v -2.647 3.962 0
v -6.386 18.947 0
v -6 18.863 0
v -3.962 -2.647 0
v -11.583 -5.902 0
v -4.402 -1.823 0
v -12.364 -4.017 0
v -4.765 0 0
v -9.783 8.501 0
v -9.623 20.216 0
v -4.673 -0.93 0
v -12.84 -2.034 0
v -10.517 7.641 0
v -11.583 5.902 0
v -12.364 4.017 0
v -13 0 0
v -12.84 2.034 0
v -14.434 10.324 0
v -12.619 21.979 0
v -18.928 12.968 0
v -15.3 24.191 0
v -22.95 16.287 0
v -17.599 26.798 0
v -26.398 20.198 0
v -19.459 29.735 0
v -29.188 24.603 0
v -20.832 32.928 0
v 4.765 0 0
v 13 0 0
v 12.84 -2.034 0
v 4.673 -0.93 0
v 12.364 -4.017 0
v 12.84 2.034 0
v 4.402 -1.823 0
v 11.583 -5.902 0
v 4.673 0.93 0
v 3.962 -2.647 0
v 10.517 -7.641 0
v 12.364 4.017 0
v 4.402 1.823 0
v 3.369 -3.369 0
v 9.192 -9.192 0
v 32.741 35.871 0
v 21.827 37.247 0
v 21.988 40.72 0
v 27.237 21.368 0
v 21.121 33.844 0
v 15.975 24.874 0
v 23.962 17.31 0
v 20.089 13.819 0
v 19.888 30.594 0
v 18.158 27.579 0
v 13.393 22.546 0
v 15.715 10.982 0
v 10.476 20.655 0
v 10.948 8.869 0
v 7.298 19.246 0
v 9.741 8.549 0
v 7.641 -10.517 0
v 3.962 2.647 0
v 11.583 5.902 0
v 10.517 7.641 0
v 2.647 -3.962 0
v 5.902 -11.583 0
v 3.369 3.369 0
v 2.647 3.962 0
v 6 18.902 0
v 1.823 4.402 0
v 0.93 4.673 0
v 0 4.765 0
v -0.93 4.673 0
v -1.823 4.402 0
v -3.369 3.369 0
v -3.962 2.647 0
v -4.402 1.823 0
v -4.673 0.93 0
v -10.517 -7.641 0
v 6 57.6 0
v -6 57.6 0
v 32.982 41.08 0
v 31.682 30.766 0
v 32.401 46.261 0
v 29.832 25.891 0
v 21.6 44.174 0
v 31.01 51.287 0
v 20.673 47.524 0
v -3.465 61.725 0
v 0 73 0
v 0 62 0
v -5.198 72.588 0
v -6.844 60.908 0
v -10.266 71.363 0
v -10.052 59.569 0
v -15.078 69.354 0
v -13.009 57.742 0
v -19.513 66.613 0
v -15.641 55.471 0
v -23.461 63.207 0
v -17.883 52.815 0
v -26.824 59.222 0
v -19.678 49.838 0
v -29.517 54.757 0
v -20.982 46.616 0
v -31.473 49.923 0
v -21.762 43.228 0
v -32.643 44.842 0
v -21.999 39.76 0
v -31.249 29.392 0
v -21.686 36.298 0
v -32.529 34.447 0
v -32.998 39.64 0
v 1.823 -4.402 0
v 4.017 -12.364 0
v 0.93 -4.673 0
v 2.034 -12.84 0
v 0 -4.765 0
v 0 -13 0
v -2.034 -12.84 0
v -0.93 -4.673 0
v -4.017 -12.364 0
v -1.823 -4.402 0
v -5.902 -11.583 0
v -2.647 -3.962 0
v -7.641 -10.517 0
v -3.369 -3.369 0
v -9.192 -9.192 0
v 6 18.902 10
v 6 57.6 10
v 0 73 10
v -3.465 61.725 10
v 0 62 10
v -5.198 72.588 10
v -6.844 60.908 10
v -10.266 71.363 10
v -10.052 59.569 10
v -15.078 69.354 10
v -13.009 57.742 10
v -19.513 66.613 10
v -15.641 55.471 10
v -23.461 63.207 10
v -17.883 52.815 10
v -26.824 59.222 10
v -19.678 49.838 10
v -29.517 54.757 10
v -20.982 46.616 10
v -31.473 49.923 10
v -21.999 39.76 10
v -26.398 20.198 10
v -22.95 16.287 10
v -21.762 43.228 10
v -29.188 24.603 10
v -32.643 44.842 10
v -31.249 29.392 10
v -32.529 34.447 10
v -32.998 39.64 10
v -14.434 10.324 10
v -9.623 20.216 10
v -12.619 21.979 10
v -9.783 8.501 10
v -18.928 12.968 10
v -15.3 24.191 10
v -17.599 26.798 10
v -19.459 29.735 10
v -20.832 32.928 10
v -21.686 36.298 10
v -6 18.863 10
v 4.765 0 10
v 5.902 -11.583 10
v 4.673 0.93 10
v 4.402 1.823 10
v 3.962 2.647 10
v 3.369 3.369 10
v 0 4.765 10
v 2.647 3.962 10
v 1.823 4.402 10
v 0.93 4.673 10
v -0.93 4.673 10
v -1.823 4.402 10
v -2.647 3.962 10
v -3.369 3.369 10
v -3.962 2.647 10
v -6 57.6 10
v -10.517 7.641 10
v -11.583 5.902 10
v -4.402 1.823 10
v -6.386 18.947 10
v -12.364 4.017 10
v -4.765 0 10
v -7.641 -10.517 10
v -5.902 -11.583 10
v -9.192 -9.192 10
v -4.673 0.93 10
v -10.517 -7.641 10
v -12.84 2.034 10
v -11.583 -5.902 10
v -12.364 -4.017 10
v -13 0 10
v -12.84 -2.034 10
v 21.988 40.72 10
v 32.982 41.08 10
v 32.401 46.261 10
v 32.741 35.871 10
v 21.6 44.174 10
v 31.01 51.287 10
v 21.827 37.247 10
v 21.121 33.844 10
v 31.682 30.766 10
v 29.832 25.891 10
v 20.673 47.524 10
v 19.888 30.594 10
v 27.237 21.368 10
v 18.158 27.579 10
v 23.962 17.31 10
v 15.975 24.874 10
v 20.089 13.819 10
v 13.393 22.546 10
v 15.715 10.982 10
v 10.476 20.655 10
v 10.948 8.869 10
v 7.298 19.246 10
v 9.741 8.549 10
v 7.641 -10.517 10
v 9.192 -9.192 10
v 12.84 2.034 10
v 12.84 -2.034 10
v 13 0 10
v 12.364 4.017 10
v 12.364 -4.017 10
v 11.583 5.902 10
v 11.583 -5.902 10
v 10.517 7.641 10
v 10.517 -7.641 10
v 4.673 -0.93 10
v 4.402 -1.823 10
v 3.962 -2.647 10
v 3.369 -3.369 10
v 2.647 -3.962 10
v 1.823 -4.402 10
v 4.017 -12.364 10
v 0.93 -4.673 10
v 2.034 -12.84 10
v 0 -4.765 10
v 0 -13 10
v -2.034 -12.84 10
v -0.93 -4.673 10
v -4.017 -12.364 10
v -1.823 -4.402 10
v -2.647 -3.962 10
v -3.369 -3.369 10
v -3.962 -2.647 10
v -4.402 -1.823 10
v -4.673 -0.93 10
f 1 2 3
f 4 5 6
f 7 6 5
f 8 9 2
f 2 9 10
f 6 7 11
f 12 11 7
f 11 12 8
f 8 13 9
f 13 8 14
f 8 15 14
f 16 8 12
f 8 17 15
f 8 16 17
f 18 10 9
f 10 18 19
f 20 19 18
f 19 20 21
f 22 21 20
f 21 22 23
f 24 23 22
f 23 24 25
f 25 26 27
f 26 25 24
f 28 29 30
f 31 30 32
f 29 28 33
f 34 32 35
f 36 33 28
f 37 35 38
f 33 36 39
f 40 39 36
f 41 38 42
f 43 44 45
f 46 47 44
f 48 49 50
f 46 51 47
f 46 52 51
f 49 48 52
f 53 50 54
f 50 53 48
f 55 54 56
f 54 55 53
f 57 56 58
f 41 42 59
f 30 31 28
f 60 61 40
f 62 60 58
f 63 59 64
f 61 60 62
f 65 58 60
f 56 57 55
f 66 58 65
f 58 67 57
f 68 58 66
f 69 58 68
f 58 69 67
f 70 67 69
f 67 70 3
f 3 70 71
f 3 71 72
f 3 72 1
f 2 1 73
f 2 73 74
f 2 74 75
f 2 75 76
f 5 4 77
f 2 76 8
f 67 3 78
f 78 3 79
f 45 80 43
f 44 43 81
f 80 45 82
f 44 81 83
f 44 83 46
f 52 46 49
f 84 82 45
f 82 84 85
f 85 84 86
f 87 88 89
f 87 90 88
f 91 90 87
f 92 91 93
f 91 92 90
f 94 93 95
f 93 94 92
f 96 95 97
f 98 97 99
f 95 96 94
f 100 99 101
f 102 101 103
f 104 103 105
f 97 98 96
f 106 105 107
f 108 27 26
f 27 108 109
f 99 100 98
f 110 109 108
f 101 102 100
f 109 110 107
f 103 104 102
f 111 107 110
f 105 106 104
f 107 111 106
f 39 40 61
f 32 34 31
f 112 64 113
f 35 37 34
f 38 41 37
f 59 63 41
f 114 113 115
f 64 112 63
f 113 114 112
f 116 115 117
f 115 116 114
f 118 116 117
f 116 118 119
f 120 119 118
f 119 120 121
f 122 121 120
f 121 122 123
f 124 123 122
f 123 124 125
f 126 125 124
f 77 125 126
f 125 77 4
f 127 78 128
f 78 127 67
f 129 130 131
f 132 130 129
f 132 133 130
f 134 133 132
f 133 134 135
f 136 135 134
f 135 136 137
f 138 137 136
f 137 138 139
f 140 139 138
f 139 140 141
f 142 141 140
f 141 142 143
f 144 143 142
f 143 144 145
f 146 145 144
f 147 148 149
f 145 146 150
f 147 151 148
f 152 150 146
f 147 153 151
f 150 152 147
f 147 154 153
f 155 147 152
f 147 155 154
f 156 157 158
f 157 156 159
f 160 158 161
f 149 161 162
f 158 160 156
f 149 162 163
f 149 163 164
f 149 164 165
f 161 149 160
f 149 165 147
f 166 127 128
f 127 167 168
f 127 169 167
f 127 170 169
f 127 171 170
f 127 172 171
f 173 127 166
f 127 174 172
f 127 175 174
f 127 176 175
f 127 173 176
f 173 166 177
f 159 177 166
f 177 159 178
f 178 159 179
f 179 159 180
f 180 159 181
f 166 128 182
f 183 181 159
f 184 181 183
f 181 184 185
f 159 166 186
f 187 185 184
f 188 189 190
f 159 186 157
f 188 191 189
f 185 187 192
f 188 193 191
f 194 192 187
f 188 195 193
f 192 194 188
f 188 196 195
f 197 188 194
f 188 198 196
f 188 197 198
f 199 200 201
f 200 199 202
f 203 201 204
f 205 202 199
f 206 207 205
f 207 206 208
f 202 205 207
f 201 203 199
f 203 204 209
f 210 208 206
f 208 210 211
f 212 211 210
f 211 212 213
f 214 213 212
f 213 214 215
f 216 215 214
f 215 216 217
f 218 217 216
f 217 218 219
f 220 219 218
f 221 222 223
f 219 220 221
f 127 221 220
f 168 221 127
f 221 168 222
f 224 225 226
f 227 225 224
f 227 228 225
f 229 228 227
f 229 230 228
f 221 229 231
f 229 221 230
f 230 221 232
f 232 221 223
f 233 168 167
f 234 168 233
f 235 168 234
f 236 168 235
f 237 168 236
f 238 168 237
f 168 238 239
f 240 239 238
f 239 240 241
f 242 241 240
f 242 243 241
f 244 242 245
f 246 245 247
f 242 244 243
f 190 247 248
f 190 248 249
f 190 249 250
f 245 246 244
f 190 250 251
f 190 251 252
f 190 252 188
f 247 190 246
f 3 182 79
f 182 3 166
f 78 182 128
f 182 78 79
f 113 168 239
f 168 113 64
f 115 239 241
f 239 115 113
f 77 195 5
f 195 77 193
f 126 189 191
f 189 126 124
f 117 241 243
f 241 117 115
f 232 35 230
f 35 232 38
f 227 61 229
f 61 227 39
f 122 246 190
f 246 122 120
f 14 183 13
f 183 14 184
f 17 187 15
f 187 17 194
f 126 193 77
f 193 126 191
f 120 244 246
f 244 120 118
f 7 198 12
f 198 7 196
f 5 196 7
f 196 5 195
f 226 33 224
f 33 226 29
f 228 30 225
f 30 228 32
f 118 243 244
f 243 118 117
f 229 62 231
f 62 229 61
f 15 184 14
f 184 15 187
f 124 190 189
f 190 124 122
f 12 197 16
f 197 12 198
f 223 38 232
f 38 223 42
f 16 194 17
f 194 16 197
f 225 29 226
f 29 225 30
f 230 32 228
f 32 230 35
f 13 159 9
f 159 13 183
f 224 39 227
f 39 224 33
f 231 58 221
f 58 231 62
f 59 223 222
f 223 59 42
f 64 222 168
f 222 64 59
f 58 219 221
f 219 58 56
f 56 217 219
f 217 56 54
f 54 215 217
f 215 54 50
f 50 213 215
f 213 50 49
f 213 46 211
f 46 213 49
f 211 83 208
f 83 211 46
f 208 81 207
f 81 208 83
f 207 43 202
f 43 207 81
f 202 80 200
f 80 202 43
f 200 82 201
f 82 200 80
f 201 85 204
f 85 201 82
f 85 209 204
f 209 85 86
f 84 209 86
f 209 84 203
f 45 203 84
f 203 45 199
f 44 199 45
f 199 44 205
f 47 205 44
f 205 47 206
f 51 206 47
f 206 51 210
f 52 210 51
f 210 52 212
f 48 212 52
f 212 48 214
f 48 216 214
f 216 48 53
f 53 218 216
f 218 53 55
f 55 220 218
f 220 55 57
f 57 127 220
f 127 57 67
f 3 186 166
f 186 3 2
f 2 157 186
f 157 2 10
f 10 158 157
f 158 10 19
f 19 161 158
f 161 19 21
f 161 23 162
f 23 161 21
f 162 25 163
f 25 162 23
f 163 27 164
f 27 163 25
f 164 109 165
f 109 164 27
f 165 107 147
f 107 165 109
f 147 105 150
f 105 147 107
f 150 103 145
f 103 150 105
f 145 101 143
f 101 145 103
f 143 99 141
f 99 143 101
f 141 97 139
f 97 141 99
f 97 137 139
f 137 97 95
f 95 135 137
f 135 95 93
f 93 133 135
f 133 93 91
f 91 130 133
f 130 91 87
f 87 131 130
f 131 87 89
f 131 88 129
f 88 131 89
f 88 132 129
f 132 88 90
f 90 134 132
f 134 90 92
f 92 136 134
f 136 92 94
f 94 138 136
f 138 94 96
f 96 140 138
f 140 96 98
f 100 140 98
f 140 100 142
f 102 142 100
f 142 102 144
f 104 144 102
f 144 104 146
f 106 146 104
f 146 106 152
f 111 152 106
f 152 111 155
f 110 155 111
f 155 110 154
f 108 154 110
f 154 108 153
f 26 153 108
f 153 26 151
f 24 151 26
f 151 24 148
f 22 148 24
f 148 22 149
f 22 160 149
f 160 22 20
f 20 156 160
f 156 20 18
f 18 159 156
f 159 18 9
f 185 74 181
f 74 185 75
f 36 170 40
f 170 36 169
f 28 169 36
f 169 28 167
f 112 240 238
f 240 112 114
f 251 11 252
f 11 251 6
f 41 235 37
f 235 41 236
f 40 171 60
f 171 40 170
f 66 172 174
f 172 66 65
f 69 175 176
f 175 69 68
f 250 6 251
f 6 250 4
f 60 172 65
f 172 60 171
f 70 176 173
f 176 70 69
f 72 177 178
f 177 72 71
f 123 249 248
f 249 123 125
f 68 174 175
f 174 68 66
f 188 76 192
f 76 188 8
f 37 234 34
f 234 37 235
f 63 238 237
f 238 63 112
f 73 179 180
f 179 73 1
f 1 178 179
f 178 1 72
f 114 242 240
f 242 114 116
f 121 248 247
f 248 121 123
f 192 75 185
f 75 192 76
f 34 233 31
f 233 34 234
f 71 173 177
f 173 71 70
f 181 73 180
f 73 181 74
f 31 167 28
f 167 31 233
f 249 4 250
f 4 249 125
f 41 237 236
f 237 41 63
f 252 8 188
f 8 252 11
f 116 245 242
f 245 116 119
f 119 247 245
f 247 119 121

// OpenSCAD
$fn = 32;

// ----------------------------------------------------------------------
// Hook: 80 mm shank into a 22 mm curl, 10 mm thick
// ----------------------------------------------------------------------

// --- parameters (mm) ---
shank_len = 80;           // shank length from the boss centre
shank_w = 12;             // shank width
boss_d = 26;              // boss diameter
bore_d = 9.53;            // boss bore
curl_in = 22;             // curl inner radius
curl_out = 33;            // curl outer radius
curl_sweep = 290;         // curl sweep angle
hook_t = 10;              // hook thickness

shank_profile = [[-6, 57.6], [6, 57.6], [6, 11], [-6, 11]];
boss_profile = [[13, 0], [12.84, 2.034], [12.364, 4.017], [11.583, 5.902], [10.517, 7.641], [9.192, 9.192], [7.641, 10.517], [5.902, 11.583], [4.017, 12.364], [2.034, 12.84], [0, 13], [-2.034, 12.84], [-4.017, 12.364], [-5.902, 11.583], [-7.641, 10.517], [-9.192, 9.192], [-10.517, 7.641], [-11.583, 5.902], [-12.364, 4.017], [-12.84, 2.034], [-13, 0], [-12.84, -2.034], [-12.364, -4.017], [-11.583, -5.902], [-10.517, -7.641], [-9.192, -9.192], [-7.641, -10.517], [-5.902, -11.583], [-4.017, -12.364], [-2.034, -12.84], [0, -13], [2.034, -12.84], [4.017, -12.364], [5.902, -11.583], [7.641, -10.517], [9.192, -9.192], [10.517, -7.641], [11.583, -5.902], [12.364, -4.017], [12.84, -2.034]];
curl_profile = [[0, 73], [-5.198, 72.588], [-10.266, 71.363], [-15.078, 69.354], [-19.513, 66.613], [-23.461, 63.207], [-26.824, 59.222], [-29.517, 54.757], [-31.473, 49.923], [-32.643, 44.842], [-32.998, 39.64], [-32.529, 34.447], [-31.249, 29.392], [-29.188, 24.603], [-26.398, 20.198], [-22.95, 16.287], [-18.928, 12.968], [-14.434, 10.324], [-9.579, 8.421], [-4.486, 7.306], [0.72, 7.008], [5.908, 7.533], [10.948, 8.869], [15.715, 10.982], [20.089, 13.819], [23.962, 17.31], [27.237, 21.368], [29.832, 25.891], [31.682, 30.766], [32.741, 35.871], [32.982, 41.08], [32.401, 46.261], [31.01, 51.287], [20.673, 47.524], [21.6, 44.174], [21.988, 40.72], [21.827, 37.247], [21.121, 33.844], [19.888, 30.594], [18.158, 27.579], [15.975, 24.874], [13.393, 22.546], [10.476, 20.655], [7.298, 19.246], [3.938, 18.355], [0.48, 18.005], [-2.99, 18.204], [-6.386, 18.947], [-9.623, 20.216], [-12.619, 21.979], [-15.3, 24.191], [-17.599, 26.798], [-19.459, 29.735], [-20.832, 32.928], [-21.686, 36.298], [-21.999, 39.76], [-21.762, 43.228], [-20.982, 46.616], [-19.678, 49.838], [-17.883, 52.815], [-15.641, 55.471], [-13.009, 57.742], [-10.052, 59.569], [-6.844, 60.908], [-3.465, 61.725], [0, 62]];

difference() {
  union() {
    /* three overlapping outlines: shank, boss and the smooth curl */
    linear_extrude(height = hook_t) polygon(shank_profile);
    linear_extrude(height = hook_t) polygon(boss_profile);
    linear_extrude(height = hook_t) polygon(curl_profile);
  }
  translate([0, 0, -2.5]) cylinder(h = hook_t + 5, d = bore_d);
}
